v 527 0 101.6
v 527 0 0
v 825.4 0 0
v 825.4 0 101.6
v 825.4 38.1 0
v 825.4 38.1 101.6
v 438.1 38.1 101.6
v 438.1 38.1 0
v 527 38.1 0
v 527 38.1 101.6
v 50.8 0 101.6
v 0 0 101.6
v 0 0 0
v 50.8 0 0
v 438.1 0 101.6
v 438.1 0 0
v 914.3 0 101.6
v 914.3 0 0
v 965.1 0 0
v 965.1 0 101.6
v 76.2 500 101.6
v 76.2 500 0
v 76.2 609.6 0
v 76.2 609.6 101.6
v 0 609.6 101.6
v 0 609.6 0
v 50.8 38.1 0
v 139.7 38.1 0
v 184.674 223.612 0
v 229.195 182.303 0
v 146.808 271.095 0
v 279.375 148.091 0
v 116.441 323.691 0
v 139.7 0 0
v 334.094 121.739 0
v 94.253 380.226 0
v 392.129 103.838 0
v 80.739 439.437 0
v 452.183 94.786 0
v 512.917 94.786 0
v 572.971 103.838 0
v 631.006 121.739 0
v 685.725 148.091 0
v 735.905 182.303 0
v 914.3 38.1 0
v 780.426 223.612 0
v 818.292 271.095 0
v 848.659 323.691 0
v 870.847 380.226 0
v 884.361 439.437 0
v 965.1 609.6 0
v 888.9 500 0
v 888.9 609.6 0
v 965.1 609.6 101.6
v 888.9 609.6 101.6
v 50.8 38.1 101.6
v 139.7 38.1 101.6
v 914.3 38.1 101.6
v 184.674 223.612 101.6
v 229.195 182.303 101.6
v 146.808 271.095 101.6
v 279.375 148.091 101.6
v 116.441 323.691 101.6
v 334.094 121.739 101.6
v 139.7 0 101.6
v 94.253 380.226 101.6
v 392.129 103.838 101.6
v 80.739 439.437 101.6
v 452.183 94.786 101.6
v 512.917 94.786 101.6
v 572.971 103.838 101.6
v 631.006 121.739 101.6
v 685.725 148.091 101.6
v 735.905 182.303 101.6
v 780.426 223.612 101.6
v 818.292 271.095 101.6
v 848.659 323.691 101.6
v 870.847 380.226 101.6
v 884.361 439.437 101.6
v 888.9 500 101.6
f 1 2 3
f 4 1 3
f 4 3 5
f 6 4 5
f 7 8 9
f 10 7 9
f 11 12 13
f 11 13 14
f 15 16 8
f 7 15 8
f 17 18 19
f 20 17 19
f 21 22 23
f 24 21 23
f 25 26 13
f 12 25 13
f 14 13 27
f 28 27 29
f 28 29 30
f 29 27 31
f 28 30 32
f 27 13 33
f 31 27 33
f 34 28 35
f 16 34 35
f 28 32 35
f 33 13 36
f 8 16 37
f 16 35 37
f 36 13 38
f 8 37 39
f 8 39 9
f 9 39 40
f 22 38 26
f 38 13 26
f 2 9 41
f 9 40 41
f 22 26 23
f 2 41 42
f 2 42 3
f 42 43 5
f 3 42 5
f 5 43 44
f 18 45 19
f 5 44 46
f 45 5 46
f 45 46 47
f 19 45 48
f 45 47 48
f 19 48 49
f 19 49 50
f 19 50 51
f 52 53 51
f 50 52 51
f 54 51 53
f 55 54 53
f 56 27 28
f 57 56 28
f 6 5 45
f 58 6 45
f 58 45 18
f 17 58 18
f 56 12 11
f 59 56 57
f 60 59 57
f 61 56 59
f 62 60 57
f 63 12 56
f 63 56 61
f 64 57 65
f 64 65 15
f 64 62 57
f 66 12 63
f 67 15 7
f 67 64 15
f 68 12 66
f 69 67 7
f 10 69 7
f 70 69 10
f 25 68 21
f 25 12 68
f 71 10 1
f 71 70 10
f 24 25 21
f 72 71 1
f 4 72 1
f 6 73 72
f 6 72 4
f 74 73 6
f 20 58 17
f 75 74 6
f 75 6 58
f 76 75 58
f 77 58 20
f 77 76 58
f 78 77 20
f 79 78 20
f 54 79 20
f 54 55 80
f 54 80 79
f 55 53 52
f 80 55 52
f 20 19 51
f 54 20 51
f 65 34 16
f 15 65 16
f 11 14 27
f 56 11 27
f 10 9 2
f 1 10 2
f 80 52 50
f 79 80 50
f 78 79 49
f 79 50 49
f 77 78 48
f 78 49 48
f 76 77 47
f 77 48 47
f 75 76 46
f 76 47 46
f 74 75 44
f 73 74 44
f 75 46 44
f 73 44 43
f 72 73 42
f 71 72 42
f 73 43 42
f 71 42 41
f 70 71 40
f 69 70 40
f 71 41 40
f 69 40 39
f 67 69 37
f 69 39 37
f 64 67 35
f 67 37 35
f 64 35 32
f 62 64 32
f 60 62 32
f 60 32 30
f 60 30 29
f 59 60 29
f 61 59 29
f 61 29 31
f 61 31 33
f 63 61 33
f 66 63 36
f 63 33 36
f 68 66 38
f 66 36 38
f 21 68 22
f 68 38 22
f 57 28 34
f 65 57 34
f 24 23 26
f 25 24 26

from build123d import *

# Parameters (mm, degrees)
BOSS_EXTRUDE1_DEPTH = 101.6


with BuildPart() as part:
    # Sketch1 → Boss-Extrude1 (new body)
    with BuildSketch(Plane.XY):
        with BuildLine():
            Line((76.2, 500), (76.2, 609.6))
            Line((76.2, 609.6), (0, 609.6))
            Line((0, 609.6), (0, 0))
            Line((0, 0), (50.8, 0))
            Line((50.8, 0), (50.8, 38.1))
            Line((50.8, 38.1), (139.7, 38.1))
            Line((139.7, 38.1), (139.7, 0))
            Line((139.7, 0), (438.1, 0))
            Line((438.1, 0), (438.1, 38.1))
            Line((438.1, 38.1), (527, 38.1))
            Line((527, 38.1), (527, 0))
            Line((527, 0), (825.4, 0))
            Line((825.4, 0), (825.4, 38.1))
            Line((825.4, 38.1), (914.3, 38.1))
            Line((914.3, 38.1), (914.3, 0))
            Line((914.3, 0), (965.1, 0))
            Line((965.1, 0), (965.1, 609.6))
            Line((965.1, 609.6), (888.9, 609.6))
            Line((888.9, 609.6), (888.9, 500))
            ThreePointArc((888.9, 500), (482.55, 93.65), (76.2, 500))
        make_face()
    extrude(amount=BOSS_EXTRUDE1_DEPTH)


solid = part.part
